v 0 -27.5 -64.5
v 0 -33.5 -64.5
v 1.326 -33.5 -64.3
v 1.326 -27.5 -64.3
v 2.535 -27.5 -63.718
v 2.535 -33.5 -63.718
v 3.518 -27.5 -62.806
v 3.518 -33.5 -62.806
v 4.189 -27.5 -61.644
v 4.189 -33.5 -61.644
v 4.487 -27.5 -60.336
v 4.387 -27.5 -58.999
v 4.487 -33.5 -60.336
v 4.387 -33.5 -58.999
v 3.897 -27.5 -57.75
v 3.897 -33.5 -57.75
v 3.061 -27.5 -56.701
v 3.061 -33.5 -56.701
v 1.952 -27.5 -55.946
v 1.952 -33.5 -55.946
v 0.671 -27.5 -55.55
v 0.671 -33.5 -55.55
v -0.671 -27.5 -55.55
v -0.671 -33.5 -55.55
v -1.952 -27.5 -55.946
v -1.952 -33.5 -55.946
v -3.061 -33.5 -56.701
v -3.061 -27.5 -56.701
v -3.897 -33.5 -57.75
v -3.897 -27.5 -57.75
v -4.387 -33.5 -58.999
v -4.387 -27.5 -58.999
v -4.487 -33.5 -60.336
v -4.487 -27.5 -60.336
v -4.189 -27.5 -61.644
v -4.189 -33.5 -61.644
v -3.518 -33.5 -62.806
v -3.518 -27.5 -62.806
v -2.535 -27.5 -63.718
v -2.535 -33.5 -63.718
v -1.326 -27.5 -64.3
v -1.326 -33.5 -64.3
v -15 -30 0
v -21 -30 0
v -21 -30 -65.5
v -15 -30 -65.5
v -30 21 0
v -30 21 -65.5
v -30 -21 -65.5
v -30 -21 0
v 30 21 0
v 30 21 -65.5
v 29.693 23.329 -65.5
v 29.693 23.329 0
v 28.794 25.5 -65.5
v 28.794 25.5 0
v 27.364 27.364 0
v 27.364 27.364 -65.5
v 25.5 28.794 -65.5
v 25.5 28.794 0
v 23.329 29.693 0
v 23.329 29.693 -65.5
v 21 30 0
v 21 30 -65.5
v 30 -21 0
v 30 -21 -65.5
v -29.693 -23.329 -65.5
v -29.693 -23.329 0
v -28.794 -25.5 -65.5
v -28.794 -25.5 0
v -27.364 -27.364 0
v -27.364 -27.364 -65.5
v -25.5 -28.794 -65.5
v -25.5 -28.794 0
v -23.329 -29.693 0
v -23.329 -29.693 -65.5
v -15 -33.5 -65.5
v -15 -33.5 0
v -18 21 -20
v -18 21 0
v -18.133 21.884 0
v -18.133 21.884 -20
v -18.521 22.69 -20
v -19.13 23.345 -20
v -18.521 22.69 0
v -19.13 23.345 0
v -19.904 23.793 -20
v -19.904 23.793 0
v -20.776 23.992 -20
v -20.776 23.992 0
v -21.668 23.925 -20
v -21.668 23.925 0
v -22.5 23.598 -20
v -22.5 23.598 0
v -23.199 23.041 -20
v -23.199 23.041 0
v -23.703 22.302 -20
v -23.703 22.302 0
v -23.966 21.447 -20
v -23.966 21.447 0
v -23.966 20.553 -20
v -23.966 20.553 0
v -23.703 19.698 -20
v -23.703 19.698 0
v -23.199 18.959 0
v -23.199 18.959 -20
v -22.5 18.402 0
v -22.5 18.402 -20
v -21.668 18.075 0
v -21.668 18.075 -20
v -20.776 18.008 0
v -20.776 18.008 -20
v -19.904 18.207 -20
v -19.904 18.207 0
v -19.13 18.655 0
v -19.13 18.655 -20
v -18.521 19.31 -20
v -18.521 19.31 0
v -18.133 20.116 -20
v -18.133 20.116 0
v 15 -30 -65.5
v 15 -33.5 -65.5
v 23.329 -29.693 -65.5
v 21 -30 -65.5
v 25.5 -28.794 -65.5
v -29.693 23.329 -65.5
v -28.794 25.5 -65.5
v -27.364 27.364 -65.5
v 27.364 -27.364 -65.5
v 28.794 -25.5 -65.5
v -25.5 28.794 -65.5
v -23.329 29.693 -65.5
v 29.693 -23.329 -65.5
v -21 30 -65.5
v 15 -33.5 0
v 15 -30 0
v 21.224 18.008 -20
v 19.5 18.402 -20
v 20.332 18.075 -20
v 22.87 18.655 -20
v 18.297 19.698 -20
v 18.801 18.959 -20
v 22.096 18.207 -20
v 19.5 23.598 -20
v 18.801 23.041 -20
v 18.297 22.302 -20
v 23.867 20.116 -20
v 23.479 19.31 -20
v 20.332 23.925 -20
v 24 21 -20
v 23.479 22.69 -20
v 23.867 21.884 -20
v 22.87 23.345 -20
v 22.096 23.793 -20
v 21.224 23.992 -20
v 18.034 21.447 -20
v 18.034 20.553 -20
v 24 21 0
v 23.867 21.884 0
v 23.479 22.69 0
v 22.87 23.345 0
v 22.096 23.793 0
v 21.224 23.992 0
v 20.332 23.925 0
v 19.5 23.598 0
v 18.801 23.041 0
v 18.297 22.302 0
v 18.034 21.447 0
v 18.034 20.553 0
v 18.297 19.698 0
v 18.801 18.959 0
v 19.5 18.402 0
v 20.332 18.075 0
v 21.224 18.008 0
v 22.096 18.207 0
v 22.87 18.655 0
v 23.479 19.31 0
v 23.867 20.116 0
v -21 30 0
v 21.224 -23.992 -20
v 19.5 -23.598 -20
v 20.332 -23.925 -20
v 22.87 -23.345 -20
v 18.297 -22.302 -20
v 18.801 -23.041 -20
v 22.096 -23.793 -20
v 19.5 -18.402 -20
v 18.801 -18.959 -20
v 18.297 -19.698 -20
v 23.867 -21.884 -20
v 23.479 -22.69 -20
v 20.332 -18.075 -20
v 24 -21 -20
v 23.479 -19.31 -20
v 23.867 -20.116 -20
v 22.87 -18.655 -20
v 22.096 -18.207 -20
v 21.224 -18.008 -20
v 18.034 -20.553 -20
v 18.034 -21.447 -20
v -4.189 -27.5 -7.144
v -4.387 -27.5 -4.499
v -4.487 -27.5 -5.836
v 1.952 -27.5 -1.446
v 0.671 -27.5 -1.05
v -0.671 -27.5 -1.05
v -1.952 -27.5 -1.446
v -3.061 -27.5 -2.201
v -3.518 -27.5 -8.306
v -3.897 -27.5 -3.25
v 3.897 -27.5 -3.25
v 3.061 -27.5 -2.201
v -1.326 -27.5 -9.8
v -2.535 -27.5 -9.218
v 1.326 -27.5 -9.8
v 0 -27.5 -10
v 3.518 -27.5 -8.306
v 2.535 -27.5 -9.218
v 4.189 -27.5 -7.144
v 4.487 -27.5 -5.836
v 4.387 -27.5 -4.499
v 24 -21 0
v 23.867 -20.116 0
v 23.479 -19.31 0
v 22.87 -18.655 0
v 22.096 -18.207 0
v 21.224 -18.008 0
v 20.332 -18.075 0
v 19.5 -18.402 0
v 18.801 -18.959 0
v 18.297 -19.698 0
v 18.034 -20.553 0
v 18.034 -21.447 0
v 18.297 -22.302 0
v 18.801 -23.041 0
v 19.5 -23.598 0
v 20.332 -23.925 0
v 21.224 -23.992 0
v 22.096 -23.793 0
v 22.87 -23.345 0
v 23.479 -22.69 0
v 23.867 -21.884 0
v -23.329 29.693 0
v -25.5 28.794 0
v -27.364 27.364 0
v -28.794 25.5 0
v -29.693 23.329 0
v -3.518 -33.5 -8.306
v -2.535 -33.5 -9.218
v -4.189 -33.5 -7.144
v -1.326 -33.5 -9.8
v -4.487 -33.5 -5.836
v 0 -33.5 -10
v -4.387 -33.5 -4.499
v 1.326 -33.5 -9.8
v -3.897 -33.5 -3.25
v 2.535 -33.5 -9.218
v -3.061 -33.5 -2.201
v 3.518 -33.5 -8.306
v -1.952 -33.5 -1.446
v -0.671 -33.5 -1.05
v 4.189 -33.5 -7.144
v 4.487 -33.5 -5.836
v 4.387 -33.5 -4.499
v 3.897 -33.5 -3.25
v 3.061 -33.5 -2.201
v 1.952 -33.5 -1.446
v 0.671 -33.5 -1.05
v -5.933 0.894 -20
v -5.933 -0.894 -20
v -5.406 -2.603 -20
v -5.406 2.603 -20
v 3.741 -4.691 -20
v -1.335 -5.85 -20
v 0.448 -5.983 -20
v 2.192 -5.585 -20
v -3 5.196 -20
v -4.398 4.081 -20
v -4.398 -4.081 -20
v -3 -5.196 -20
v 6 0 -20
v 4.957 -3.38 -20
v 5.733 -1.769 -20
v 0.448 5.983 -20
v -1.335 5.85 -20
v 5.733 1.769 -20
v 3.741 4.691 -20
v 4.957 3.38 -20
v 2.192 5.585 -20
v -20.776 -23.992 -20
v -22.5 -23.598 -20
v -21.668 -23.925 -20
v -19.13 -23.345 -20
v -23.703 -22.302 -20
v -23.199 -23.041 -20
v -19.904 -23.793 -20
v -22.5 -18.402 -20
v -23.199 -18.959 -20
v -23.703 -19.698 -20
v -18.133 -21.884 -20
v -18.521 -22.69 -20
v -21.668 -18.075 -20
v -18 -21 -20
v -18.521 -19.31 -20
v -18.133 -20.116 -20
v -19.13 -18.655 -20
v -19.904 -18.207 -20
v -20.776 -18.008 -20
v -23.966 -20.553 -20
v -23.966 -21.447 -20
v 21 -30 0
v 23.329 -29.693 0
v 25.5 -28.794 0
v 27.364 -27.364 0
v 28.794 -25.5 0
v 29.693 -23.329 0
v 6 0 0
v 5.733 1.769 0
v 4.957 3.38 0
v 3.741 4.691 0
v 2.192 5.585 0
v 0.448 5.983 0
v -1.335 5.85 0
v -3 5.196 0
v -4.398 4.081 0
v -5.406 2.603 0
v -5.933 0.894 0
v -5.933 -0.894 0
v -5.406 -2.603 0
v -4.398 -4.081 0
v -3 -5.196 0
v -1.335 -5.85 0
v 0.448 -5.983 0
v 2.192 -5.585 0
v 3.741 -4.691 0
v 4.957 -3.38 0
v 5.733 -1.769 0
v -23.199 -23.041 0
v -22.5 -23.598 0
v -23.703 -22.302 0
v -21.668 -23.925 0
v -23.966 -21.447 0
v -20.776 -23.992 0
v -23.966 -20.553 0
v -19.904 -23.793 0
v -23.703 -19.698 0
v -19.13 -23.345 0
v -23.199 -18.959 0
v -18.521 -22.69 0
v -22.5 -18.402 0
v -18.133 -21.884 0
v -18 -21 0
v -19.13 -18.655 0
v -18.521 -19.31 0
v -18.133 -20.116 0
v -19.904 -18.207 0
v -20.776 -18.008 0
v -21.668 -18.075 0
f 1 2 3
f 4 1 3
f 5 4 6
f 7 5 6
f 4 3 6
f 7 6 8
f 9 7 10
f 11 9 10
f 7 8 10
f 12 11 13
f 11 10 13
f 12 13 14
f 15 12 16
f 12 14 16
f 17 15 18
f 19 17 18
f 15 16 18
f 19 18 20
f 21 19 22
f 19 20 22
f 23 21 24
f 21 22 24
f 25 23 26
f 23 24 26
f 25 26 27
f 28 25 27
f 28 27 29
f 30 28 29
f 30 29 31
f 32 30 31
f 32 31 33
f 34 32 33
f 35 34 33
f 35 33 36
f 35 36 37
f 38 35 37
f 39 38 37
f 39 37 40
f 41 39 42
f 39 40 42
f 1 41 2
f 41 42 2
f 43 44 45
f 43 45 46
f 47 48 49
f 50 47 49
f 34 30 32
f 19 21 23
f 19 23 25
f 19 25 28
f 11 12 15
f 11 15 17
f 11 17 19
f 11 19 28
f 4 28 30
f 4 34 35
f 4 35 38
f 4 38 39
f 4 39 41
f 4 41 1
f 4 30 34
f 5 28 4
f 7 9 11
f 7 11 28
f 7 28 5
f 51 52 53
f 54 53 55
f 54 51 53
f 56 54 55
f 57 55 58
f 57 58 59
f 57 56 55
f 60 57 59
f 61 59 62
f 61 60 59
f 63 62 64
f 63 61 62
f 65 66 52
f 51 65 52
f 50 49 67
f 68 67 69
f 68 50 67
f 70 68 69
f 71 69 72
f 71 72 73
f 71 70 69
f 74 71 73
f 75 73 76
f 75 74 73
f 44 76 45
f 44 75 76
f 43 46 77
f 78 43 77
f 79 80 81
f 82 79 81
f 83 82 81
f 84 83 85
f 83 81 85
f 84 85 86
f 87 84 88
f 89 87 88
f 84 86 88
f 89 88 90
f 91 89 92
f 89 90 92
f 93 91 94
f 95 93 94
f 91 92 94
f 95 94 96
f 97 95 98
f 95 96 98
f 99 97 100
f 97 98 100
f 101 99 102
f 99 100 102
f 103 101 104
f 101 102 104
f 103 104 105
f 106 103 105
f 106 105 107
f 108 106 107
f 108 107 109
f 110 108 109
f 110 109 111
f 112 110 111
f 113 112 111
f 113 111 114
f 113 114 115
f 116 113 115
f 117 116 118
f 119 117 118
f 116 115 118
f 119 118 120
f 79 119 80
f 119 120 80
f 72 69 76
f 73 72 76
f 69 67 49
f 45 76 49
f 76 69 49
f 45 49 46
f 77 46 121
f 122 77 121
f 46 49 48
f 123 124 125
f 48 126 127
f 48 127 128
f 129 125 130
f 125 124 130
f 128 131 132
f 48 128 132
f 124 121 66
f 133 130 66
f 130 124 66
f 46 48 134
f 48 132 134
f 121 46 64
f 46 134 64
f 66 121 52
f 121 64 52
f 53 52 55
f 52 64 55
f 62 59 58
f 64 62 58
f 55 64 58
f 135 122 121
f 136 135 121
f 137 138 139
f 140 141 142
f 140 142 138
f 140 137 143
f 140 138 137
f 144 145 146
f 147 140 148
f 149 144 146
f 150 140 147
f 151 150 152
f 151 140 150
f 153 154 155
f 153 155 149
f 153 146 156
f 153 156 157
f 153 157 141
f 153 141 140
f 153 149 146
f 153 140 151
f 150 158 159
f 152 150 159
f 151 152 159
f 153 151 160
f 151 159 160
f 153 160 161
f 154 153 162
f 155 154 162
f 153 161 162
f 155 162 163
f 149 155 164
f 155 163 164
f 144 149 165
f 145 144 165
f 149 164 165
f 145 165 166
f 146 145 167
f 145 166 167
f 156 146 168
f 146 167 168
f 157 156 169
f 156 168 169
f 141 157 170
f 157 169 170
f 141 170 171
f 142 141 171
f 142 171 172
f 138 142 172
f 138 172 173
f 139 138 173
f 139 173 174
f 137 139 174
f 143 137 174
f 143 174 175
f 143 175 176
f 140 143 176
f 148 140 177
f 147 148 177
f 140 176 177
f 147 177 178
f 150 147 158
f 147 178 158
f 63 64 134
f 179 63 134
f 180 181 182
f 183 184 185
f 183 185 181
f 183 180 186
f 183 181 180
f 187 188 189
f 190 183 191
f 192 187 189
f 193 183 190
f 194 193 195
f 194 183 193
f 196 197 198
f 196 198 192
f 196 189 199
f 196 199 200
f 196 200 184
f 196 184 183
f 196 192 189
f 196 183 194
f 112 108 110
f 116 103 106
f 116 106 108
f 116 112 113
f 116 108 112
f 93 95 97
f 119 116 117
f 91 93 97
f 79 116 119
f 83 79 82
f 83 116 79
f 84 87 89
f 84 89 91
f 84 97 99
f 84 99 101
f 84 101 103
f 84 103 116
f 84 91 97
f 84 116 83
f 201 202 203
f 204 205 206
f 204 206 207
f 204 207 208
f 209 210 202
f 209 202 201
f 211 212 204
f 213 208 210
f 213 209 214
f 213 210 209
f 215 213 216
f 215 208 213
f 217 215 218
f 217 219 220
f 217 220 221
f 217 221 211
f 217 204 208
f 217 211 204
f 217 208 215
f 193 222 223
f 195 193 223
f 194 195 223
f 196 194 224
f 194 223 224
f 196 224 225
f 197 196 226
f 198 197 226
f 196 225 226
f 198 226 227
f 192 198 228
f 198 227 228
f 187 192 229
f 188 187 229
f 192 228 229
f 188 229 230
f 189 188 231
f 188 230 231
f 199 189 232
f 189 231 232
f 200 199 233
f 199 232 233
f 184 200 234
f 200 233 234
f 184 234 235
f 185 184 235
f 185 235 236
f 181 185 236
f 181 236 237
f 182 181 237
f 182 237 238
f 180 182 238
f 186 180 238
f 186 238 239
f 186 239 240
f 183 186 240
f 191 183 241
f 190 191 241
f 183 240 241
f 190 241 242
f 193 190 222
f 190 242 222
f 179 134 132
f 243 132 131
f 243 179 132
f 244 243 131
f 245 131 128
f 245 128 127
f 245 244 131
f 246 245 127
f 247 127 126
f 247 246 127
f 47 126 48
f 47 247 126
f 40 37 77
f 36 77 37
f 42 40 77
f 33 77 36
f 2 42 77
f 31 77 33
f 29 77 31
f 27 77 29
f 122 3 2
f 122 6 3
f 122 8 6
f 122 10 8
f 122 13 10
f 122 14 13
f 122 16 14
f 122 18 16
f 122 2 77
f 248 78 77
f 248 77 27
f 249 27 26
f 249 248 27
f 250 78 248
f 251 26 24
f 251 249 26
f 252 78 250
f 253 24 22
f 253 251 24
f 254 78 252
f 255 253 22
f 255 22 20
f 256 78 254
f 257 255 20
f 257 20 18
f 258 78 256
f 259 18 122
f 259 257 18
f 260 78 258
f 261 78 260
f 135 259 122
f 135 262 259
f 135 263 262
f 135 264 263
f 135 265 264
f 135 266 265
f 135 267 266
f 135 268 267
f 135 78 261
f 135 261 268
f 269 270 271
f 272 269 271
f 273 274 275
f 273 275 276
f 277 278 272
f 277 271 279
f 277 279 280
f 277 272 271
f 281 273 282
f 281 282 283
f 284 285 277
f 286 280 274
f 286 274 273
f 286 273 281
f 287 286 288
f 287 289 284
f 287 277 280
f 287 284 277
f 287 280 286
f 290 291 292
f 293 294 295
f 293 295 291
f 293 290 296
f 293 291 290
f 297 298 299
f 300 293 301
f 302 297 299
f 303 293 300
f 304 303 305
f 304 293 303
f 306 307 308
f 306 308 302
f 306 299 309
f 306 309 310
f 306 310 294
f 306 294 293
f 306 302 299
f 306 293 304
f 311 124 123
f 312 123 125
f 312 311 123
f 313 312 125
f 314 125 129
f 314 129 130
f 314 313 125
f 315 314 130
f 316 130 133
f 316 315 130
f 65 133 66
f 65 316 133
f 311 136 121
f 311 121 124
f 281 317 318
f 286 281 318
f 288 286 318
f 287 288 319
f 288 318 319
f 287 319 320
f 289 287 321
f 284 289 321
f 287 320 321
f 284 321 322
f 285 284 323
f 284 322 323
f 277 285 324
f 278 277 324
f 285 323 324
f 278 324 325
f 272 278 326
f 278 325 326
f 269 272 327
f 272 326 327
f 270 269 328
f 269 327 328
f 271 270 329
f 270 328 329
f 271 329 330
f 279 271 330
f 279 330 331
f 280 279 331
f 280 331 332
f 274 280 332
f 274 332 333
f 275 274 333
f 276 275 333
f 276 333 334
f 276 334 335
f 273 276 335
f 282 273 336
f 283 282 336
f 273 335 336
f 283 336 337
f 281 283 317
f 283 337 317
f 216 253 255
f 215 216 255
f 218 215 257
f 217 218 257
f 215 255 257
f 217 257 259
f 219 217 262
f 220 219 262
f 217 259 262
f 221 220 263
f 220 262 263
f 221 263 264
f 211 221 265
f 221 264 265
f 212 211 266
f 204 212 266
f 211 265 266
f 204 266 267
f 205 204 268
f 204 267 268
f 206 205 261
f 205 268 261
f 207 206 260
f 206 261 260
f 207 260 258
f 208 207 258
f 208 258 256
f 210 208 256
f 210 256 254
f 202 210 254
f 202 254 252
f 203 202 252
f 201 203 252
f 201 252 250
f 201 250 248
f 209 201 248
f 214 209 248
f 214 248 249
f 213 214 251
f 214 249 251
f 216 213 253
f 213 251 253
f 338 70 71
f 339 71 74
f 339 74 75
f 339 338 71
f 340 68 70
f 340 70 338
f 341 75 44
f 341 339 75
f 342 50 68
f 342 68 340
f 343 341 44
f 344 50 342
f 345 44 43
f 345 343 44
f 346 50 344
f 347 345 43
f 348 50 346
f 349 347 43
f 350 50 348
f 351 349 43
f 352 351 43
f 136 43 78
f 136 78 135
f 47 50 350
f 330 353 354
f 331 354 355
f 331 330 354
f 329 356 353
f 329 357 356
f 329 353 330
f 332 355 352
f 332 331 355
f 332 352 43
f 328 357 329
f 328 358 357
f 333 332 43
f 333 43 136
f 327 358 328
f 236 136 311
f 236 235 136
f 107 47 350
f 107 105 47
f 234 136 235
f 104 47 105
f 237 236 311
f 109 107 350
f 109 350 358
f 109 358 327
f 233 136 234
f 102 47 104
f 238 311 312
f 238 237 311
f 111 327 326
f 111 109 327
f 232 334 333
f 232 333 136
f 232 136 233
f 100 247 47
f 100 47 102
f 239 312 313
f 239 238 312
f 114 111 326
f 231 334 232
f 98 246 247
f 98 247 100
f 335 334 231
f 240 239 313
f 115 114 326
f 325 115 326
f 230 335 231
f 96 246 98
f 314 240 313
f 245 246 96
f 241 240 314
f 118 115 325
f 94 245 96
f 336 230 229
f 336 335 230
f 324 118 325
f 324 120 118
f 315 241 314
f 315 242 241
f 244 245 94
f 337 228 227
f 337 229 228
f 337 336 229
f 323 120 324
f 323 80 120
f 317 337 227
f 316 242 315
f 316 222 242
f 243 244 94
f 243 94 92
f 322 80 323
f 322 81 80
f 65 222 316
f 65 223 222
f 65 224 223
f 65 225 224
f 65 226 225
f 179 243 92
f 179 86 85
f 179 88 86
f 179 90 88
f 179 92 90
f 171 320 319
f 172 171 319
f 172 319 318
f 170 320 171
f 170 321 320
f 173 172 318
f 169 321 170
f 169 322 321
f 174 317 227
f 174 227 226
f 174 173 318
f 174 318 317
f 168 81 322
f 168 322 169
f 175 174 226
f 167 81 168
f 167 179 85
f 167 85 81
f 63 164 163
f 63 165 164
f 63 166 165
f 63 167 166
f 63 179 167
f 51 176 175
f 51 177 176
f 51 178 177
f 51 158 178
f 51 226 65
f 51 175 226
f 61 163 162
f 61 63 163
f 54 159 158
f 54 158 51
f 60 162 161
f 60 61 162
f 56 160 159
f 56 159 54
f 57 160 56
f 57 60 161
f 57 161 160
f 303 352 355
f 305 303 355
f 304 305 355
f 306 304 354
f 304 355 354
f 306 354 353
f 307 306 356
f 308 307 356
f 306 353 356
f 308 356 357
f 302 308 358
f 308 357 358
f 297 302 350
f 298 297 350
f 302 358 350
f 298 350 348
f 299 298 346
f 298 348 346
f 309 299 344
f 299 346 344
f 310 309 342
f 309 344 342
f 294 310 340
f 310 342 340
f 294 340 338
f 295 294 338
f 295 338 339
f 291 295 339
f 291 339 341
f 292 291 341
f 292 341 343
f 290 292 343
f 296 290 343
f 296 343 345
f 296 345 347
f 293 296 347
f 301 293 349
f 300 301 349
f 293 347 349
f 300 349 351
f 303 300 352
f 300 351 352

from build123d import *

# Parameters (mm, degrees)
SALIENTE_EXTRUIR1_DEPTH = 65.5
CROQUIS2_R              = 3
CORTAR_EXTRUIR1_DEPTH   = 20
CROQUIS3_R              = 6
CORTAR_EXTRUIR2_DEPTH   = 20
CROQUIS4_R              = 4.5
CORTAR_EXTRUIR3_DEPTH   = 6


with BuildPart() as part:
    # Croquis1 → Saliente-Extruir1 (new body)
    with BuildSketch(Plane.XY):
        with BuildLine():
            Line((-15, -30), (-15, -33.5))
            Line((-15, -33.5), (15, -33.5))
            Line((15, -33.5), (15, -30))
            Line((15, -30), (21, -30))
            ThreePointArc((21, -30), (27.363961031, -27.363961031), (30, -21))
            Line((30, -21), (30, 21))
            ThreePointArc((30, 21), (27.363961031, 27.363961031), (21, 30))
            Line((21, 30), (-21, 30))
            ThreePointArc((-21, 30), (-27.363961031, 27.363961031), (-30, 21))
            Line((-30, 21), (-30, -21))
            ThreePointArc((-30, -21), (-27.363961031, -27.363961031), (-21, -30))
            Line((-21, -30), (-15, -30))
        make_face()
    extrude(amount=-SALIENTE_EXTRUIR1_DEPTH)

    # Croquis2 → Cortar-Extruir1 (cut)
    with BuildSketch(Plane.XY):
        with Locations((-21, 21)):
            Circle(CROQUIS2_R)
        with Locations((21, 21)):
            Circle(CROQUIS2_R)
        with Locations((21, -21)):
            Circle(CROQUIS2_R)
        with Locations((-21, -21)):
            Circle(CROQUIS2_R)
    extrude(amount=-CORTAR_EXTRUIR1_DEPTH, mode=Mode.SUBTRACT)

    # Croquis3 → Cortar-Extruir2 (cut)
    with BuildSketch(Plane.XY):
        Circle(CROQUIS3_R)
    extrude(amount=-CORTAR_EXTRUIR2_DEPTH, mode=Mode.SUBTRACT)

    # Croquis4 → Cortar-Extruir3 (cut)
    with BuildSketch(Plane.XZ.offset(33.5)):
        with Locations(Location((0, -5.5, 0), (0, 0, 270))):
            Circle(CROQUIS4_R)
        with Locations(Location((0, -60, 0), (0, 0, 270))):
            Circle(CROQUIS4_R)
    extrude(amount=-CORTAR_EXTRUIR3_DEPTH, mode=Mode.SUBTRACT)


solid = part.part
